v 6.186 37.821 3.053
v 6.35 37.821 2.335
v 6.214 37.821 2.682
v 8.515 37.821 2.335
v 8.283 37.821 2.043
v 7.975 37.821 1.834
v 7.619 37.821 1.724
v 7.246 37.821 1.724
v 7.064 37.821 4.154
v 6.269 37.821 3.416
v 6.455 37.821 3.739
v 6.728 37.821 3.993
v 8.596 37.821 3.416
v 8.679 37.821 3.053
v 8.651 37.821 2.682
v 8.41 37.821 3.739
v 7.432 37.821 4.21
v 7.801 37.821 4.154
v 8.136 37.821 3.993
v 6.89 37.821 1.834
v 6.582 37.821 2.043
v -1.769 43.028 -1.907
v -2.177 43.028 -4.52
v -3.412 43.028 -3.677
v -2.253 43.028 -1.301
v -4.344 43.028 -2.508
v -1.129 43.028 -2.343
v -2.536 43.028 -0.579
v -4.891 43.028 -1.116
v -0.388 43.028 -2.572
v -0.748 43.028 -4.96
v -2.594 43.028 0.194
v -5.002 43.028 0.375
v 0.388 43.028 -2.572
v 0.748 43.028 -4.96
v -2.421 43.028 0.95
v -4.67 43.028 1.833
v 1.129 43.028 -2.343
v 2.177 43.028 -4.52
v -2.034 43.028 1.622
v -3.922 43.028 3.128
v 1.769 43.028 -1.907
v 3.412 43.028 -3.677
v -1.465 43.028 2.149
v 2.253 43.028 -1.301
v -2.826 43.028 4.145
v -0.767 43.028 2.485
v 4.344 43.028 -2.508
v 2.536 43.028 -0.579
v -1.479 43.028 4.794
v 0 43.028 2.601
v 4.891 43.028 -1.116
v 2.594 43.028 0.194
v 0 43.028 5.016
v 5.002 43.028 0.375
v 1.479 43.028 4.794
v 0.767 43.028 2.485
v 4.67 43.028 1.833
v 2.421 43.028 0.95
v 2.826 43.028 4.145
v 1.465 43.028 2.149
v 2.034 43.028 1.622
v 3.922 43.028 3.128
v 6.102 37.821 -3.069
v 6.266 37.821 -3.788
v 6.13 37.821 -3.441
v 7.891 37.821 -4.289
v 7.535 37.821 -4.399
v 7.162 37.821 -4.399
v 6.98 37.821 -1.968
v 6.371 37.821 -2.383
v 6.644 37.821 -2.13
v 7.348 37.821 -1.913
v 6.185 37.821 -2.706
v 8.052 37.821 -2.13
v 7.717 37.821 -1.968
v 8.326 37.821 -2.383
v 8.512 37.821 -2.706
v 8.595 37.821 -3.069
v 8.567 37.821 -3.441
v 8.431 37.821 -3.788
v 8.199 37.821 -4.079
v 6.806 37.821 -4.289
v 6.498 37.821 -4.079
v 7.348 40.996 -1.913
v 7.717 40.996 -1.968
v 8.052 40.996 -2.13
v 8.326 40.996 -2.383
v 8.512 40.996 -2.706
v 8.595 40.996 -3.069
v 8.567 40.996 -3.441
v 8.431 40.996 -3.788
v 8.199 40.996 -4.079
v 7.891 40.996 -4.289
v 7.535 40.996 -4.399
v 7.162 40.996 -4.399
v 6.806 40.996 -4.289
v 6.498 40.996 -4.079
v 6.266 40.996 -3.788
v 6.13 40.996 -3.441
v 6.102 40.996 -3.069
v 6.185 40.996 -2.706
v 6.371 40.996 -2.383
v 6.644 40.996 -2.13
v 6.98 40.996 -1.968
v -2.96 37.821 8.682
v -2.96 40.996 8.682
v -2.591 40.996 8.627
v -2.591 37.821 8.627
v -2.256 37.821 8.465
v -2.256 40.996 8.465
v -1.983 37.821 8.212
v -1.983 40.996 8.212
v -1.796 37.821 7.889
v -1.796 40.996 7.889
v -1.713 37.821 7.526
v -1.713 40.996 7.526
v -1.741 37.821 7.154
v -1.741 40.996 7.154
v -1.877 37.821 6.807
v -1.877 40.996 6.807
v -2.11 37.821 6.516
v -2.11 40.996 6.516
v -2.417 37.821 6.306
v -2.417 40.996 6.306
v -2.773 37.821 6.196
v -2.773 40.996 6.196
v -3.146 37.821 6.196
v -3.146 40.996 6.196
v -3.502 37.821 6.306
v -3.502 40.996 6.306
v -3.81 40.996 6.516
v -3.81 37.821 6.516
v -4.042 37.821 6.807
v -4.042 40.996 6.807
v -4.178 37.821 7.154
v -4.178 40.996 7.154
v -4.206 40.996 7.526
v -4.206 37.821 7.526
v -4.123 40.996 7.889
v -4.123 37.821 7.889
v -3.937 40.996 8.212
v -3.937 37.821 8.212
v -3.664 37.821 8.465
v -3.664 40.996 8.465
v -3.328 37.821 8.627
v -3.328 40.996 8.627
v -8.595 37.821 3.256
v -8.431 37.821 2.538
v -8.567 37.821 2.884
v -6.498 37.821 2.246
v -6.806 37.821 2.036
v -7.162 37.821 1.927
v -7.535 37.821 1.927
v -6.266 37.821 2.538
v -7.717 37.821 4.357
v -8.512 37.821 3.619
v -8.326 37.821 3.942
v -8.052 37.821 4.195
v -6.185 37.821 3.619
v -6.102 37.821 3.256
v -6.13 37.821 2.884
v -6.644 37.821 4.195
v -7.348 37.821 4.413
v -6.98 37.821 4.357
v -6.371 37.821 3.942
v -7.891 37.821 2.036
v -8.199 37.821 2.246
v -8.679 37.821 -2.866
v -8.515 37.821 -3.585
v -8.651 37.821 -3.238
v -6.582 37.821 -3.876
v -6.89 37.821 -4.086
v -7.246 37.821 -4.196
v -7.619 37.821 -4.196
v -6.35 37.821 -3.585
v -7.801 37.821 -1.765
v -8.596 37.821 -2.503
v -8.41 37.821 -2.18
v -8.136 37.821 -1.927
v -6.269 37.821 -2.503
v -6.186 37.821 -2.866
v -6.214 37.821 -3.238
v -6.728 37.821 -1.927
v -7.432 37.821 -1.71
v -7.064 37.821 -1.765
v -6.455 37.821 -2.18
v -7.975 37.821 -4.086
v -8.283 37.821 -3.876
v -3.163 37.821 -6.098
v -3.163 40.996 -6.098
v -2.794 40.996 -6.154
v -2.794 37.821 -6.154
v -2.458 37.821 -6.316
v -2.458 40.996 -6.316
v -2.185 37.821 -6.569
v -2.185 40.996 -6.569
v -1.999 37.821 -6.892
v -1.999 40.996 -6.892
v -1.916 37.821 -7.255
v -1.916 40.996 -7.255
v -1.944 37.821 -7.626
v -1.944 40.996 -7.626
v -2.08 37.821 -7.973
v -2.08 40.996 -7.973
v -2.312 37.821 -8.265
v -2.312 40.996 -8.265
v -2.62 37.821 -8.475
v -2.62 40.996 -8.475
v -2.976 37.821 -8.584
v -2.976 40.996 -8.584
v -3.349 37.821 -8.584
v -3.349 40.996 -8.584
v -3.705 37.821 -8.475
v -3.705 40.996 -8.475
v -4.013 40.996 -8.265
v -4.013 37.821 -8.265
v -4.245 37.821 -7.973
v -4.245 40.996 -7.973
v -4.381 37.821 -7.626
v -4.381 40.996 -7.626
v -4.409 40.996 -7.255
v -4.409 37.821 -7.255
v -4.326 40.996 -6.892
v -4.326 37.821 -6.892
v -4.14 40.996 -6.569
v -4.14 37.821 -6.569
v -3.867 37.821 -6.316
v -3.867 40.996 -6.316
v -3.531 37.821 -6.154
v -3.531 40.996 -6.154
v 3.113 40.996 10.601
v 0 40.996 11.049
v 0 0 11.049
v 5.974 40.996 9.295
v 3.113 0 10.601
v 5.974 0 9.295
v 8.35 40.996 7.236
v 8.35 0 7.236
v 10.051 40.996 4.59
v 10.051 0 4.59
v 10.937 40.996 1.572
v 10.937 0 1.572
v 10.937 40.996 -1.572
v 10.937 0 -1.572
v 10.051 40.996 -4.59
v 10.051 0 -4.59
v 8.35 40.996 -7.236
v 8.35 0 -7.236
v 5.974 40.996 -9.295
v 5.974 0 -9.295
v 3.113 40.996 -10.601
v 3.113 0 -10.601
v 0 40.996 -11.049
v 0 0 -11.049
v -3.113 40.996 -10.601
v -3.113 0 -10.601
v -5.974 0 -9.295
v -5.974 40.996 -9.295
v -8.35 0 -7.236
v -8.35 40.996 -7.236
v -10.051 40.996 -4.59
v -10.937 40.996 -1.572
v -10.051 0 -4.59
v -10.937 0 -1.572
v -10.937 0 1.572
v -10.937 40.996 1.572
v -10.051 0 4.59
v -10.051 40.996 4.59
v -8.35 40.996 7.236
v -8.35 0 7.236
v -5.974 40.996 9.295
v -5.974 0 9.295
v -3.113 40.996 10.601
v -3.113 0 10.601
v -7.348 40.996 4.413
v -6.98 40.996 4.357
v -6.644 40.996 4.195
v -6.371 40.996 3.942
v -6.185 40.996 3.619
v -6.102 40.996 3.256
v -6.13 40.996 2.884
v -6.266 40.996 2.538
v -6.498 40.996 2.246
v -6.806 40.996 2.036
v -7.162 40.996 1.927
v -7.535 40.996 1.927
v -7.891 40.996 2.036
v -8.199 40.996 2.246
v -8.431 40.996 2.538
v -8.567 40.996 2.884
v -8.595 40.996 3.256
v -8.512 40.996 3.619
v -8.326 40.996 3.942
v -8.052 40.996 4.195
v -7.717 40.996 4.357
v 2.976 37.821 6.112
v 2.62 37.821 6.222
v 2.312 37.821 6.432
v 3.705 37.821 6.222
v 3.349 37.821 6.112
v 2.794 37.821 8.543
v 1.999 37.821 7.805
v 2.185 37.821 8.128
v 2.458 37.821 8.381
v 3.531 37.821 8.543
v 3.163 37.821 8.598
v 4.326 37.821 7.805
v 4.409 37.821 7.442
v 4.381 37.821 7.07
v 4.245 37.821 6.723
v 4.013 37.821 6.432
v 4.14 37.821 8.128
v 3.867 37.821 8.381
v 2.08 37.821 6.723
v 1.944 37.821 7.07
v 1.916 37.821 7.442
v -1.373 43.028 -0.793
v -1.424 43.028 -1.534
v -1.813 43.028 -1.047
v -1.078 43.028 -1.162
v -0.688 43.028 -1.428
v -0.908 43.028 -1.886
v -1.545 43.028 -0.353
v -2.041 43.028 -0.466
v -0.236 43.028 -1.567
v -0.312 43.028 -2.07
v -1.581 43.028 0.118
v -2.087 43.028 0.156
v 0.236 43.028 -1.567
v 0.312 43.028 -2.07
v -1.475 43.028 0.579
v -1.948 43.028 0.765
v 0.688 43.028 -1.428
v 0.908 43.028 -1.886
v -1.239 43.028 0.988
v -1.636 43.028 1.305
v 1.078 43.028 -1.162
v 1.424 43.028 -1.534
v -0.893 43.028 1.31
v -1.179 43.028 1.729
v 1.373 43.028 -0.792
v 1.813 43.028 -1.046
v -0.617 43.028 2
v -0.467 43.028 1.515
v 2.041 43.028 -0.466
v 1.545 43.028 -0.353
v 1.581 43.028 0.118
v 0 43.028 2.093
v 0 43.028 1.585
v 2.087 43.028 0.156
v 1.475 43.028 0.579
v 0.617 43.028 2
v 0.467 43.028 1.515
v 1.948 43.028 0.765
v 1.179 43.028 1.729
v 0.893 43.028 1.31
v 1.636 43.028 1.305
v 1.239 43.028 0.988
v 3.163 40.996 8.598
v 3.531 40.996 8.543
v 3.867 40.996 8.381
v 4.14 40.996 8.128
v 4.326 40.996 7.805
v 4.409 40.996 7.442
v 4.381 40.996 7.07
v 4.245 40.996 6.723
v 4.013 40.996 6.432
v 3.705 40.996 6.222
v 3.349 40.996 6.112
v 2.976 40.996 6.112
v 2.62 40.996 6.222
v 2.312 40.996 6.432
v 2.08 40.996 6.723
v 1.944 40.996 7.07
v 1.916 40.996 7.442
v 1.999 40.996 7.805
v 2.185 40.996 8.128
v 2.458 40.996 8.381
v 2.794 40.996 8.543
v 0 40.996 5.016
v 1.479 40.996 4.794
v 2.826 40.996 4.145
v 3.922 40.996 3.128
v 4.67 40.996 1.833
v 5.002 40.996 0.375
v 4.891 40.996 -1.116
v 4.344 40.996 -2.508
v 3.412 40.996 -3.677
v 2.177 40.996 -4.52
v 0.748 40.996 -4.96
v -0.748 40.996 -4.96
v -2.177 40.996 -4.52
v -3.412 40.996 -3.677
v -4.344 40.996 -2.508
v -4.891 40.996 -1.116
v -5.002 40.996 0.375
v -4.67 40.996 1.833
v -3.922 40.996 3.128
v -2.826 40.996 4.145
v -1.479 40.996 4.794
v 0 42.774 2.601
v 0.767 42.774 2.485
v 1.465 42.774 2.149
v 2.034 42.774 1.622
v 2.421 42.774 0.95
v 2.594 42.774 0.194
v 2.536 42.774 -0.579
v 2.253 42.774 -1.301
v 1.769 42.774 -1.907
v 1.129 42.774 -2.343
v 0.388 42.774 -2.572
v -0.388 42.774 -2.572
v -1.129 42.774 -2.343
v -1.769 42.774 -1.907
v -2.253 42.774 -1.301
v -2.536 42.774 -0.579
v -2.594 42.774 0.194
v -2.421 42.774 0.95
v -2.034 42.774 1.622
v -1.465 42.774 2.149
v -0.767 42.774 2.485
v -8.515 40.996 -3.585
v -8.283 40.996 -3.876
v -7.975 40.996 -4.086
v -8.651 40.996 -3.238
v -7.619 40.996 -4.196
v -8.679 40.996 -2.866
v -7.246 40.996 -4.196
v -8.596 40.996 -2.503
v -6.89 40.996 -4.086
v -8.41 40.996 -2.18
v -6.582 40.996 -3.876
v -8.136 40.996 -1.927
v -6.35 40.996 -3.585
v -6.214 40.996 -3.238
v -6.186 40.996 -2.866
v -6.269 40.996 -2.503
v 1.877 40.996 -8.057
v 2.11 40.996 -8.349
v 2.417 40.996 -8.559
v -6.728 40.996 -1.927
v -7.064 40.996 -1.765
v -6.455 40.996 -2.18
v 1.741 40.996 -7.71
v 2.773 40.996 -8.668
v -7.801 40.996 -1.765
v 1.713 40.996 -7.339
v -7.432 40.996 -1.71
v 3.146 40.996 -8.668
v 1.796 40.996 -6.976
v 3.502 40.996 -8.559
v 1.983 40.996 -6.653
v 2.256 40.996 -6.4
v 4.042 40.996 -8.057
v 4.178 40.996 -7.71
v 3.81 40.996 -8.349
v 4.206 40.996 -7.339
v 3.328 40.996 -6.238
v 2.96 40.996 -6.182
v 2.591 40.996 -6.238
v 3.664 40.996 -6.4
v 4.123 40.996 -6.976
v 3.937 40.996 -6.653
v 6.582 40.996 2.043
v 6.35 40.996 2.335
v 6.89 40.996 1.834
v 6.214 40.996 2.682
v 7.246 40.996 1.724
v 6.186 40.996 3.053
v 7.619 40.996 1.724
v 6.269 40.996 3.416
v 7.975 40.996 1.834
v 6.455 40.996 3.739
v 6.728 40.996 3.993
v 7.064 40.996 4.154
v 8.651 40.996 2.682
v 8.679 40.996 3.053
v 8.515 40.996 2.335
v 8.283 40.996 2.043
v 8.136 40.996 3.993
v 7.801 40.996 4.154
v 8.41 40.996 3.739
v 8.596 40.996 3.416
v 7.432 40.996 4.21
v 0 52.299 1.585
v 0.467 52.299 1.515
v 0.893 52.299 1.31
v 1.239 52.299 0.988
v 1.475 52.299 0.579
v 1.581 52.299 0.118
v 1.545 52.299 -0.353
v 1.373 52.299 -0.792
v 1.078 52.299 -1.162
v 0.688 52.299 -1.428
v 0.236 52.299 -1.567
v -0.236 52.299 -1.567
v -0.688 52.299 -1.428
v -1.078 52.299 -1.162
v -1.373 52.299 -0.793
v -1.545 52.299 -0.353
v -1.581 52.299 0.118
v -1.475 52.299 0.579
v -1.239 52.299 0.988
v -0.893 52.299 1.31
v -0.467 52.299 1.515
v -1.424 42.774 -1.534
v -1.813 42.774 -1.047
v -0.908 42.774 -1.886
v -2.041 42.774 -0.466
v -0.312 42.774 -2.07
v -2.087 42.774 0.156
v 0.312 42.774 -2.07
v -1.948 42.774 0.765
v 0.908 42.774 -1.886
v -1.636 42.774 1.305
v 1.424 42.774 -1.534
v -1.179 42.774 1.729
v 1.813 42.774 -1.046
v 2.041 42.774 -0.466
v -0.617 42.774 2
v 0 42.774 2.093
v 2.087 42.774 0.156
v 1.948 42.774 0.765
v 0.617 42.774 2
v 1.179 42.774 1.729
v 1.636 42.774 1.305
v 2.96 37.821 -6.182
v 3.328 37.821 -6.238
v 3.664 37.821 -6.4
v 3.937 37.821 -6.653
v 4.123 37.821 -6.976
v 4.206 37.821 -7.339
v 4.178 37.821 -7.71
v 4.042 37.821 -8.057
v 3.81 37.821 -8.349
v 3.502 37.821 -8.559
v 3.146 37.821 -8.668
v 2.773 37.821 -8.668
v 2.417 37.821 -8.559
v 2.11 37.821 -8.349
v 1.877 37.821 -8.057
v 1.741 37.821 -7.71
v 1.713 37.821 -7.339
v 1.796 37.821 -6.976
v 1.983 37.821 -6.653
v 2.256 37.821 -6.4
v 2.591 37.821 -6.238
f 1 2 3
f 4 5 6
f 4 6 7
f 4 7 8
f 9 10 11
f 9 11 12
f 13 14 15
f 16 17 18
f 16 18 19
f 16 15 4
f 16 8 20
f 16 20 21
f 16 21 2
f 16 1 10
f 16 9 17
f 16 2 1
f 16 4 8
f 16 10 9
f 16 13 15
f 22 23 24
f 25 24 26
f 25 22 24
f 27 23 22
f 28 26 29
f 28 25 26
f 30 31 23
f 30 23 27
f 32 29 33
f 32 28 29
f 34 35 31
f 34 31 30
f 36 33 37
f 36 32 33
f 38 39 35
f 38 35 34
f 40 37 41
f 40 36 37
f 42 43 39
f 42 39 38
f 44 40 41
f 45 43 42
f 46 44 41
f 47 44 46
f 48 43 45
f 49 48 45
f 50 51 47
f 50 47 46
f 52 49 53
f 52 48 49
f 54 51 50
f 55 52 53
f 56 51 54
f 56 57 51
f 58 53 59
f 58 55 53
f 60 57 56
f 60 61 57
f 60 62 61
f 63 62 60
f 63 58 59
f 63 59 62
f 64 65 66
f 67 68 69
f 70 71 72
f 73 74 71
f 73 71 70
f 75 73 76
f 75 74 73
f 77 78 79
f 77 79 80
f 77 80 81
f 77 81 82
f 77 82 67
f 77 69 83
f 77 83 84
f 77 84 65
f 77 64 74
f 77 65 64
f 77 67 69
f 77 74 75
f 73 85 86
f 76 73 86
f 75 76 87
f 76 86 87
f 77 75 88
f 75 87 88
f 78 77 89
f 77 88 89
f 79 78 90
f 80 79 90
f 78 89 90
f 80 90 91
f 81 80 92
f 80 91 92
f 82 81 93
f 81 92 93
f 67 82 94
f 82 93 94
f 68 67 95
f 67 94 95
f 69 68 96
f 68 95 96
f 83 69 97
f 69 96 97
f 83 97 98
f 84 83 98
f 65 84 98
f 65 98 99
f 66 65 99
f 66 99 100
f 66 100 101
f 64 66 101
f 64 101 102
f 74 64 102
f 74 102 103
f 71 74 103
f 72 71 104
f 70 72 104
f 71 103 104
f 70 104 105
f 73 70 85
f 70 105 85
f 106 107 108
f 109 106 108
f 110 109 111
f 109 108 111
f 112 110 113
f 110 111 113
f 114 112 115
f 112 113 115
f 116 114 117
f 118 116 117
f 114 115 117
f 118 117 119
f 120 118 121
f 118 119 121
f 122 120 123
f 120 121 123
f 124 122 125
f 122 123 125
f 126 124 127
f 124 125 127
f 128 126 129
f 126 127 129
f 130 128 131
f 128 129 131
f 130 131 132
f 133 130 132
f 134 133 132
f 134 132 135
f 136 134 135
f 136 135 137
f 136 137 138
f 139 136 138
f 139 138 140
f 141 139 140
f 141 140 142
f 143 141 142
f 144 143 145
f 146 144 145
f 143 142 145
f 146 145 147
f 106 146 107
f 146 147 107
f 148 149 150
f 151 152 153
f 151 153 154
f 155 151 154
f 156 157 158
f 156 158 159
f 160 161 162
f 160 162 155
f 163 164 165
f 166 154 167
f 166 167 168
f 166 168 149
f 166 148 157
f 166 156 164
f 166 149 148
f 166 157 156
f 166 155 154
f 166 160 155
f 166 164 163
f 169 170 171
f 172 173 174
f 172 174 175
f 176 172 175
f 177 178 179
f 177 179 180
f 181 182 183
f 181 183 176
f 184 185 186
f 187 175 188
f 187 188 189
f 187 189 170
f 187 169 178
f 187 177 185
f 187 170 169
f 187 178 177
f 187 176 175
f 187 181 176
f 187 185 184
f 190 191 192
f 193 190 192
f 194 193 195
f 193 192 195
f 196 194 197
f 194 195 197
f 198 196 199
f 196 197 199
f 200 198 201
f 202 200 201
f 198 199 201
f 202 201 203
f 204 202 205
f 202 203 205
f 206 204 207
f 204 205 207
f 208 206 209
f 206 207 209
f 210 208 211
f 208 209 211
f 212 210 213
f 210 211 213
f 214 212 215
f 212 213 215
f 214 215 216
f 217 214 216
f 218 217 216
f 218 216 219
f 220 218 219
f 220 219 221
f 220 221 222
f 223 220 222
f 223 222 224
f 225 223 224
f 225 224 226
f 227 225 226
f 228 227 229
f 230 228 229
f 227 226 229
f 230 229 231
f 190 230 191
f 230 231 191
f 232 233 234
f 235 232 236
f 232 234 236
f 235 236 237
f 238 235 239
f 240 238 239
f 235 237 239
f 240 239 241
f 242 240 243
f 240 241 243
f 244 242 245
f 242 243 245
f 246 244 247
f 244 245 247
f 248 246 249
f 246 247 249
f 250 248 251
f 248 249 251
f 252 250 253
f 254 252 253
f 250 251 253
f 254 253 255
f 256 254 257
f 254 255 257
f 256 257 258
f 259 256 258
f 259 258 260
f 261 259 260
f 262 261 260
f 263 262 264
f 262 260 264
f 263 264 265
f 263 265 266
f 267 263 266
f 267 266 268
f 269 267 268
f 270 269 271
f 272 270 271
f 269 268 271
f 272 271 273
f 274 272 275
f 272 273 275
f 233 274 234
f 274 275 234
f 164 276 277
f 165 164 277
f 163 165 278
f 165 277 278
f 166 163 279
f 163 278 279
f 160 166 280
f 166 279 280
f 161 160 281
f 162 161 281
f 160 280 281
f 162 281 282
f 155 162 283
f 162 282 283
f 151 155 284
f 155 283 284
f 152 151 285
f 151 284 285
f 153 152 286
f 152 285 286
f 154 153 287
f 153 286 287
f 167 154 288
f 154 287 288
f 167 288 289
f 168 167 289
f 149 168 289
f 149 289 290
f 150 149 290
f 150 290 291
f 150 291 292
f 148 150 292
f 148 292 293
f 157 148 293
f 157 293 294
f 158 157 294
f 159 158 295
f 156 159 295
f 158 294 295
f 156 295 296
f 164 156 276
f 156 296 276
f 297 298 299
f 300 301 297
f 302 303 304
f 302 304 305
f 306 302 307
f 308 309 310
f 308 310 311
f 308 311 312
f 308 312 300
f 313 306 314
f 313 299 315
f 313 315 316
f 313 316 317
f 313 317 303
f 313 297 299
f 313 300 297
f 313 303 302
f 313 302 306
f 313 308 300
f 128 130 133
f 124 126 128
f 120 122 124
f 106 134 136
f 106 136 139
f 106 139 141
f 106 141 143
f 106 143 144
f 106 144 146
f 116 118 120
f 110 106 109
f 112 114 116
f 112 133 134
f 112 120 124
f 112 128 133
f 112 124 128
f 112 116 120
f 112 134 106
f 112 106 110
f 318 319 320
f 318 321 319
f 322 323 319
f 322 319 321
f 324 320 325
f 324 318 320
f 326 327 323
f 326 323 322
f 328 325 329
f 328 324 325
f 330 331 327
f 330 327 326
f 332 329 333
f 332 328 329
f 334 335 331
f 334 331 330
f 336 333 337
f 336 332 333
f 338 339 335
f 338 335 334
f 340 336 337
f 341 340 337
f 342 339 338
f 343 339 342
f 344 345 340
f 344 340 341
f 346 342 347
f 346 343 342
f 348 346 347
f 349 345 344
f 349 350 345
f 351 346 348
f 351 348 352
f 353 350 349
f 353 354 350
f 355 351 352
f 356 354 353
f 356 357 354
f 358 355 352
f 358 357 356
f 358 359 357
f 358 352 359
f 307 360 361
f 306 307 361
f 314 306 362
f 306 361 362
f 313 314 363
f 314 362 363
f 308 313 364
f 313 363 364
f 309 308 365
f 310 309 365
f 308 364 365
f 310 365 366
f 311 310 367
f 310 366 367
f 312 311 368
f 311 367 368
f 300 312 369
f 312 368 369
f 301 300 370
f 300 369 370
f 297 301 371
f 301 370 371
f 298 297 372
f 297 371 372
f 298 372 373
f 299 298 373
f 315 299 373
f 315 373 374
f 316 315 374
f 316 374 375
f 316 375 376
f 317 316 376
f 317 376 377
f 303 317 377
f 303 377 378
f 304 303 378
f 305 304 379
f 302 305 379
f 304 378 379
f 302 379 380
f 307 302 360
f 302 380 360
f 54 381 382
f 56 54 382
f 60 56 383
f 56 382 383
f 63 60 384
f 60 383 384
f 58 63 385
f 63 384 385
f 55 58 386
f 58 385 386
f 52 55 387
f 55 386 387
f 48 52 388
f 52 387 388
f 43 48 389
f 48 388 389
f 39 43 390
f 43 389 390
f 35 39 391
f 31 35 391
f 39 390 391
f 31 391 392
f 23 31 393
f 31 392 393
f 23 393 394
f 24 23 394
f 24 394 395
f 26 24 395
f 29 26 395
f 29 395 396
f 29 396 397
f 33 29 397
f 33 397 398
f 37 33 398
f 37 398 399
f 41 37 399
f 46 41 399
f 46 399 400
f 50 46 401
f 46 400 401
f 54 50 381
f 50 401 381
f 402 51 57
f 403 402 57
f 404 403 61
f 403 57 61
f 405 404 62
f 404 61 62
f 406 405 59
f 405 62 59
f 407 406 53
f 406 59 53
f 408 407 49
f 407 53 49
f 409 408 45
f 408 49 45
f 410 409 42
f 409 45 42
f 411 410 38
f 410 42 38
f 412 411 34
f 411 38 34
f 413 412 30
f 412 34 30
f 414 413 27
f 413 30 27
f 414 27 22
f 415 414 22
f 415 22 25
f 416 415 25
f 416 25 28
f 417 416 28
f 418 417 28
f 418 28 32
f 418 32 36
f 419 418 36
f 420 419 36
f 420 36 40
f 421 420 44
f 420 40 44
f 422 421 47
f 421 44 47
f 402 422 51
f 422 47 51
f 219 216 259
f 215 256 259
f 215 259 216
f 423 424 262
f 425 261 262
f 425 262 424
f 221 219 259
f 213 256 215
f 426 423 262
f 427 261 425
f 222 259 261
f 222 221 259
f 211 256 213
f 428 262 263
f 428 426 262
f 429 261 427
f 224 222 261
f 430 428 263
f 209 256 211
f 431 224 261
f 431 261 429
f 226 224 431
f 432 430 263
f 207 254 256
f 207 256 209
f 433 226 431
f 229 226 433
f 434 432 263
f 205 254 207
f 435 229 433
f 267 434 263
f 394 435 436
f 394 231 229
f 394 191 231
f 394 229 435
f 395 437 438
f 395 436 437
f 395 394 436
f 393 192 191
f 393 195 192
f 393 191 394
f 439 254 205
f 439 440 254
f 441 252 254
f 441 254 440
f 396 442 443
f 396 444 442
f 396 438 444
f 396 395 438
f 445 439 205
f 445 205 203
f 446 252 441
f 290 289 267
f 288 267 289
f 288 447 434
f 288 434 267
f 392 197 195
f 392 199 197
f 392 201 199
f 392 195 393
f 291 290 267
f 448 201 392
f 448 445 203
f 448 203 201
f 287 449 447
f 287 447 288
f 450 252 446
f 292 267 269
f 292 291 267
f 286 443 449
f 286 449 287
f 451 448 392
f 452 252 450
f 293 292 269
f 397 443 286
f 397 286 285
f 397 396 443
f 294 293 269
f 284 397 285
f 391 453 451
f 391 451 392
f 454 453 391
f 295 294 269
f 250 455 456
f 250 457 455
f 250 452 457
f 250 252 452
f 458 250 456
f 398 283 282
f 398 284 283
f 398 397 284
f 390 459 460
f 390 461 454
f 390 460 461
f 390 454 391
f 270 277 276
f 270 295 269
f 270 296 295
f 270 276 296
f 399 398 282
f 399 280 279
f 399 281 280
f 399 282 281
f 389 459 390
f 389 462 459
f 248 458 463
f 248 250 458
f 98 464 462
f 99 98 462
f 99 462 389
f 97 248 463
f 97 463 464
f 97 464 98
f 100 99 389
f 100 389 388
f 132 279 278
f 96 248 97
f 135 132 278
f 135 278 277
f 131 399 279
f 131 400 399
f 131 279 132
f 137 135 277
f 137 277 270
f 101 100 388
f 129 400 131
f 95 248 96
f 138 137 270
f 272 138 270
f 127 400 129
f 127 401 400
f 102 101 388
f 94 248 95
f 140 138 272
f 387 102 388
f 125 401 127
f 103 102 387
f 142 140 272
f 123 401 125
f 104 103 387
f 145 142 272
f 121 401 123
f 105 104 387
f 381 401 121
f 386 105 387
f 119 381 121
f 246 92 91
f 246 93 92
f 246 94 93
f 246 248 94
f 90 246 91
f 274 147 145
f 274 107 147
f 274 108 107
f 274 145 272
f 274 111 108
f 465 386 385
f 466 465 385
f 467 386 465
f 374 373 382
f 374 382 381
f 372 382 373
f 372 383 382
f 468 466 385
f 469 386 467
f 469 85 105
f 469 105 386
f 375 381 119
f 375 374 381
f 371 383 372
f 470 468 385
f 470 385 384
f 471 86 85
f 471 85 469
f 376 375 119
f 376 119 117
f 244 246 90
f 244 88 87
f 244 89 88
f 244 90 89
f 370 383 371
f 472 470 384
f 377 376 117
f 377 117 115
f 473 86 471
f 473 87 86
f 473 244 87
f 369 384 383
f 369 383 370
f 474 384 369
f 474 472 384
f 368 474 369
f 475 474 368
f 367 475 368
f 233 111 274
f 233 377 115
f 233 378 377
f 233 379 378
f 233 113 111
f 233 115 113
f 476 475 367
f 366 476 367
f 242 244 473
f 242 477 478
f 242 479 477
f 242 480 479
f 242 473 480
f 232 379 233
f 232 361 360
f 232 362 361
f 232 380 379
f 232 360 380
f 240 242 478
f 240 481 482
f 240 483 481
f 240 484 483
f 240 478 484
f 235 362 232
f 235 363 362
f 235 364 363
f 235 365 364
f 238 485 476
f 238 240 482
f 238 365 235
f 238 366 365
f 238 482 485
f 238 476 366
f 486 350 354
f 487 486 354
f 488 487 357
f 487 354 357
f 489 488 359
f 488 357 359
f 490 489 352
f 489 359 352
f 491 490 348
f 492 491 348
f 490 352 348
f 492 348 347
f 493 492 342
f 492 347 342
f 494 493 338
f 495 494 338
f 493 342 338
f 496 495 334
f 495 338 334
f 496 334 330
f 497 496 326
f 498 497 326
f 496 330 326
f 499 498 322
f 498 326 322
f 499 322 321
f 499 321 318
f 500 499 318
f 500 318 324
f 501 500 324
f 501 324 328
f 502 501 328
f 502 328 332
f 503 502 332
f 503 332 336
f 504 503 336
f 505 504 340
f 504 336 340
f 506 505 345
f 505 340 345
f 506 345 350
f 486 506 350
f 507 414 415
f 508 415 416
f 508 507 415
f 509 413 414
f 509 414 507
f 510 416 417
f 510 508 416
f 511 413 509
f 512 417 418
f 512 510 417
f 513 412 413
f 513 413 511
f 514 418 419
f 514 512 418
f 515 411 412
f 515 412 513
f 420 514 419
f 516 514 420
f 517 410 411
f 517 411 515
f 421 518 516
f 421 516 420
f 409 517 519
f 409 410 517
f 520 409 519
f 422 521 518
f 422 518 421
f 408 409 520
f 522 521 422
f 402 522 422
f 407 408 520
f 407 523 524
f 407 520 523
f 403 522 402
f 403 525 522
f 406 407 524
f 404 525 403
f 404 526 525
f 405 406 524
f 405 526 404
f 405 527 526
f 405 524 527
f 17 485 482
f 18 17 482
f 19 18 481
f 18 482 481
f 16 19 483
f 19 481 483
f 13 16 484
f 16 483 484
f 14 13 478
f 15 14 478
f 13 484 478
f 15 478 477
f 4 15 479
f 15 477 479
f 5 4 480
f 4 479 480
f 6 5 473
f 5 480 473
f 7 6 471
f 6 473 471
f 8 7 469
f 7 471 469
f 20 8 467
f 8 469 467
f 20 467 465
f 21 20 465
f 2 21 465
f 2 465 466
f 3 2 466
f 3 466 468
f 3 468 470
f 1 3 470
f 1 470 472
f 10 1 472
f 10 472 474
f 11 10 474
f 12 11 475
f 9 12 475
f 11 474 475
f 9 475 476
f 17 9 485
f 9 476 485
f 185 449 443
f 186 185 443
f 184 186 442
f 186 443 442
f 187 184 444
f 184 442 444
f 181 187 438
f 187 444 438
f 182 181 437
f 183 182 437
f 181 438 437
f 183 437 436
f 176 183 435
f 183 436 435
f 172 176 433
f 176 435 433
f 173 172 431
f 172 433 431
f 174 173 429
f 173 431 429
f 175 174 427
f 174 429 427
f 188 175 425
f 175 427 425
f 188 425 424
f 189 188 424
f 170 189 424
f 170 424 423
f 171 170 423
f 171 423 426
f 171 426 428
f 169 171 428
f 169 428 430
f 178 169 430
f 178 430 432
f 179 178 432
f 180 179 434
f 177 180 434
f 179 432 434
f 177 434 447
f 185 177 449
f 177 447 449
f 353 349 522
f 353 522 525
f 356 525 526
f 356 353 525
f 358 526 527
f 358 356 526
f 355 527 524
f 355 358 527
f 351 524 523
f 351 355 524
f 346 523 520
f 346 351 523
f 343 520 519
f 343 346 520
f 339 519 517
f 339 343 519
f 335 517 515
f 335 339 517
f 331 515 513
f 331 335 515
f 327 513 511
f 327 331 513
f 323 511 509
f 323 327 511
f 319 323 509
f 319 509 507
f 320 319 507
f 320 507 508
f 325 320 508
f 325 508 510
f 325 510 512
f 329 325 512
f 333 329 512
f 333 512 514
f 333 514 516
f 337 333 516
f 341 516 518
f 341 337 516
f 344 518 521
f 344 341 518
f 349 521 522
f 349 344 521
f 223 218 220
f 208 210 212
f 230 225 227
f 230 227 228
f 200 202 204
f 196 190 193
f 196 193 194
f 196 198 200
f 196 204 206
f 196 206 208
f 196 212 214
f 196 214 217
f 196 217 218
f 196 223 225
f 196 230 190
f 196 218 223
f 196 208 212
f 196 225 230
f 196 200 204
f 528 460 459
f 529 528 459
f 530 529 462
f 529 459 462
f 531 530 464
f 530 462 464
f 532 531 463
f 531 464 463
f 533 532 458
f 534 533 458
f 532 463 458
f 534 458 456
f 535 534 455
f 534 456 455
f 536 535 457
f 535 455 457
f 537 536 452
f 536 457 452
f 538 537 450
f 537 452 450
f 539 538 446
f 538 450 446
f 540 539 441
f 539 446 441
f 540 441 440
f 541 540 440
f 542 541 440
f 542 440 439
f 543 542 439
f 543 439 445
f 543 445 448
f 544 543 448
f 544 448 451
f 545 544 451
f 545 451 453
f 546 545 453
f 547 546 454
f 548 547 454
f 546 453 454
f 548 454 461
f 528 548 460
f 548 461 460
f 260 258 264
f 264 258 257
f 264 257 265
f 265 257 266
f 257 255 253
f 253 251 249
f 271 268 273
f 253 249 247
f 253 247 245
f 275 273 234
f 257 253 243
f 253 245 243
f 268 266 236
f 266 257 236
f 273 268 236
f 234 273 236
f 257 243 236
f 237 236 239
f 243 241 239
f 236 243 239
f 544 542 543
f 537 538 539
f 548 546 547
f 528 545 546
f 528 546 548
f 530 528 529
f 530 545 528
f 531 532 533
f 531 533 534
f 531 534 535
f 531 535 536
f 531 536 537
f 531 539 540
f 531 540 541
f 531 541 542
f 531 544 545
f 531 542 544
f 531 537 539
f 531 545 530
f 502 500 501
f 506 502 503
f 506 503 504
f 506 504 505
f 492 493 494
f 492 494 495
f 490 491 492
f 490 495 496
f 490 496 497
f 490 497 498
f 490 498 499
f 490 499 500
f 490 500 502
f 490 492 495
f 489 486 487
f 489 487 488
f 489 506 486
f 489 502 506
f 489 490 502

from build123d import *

# Parameters (mm, degrees)
SKETCH1_R           = 11.049
BOSS_EXTRUDE1_DEPTH = 40.9956
SKETCH2_R           = 5.0165
BOSS_EXTRUDE2_DEPTH = 2.032
SKETCH3_R           = 1.585
BOSS_EXTRUDE3_DEPTH = 9.271
SKETCH5_R           = 1.25
CUT_EXTRUDE4_DEPTH  = 3.175
SKETCH7_R           = 2.601
SKETCH7_R_2         = 2.093
CUT_EXTRUDE5_DEPTH  = 0.254


with BuildPart() as part:
    # Sketch1 → Boss-Extrude1 (new body)
    with BuildSketch(Plane(origin=(0, 0, 0), x_dir=(1, 0, 0), z_dir=(0, 1, 0))):
        with Locations(Location((0, 0, 0), (0, 0, 270))):
            Circle(SKETCH1_R)
    extrude(amount=BOSS_EXTRUDE1_DEPTH)

    # Sketch2 → Boss-Extrude2 (add)
    with BuildSketch(Plane(origin=(0, 40.9956, 0), x_dir=(1, 0, 0), z_dir=(0, 1, 0))):
        with Locations(Location((0, 0, 0), (0, 0, 270))):
            Circle(SKETCH2_R)
    extrude(amount=BOSS_EXTRUDE2_DEPTH)

    # Sketch3 → Boss-Extrude3 (add)
    with BuildSketch(Plane(origin=(0, 43.0276, 0), x_dir=(1, 0, 0), z_dir=(0, 1, 0))):
        with Locations(Location((0, 0, 0), (0, 0, 270))):
            Circle(SKETCH3_R)
    extrude(amount=BOSS_EXTRUDE3_DEPTH)

    # Sketch5 → Cut-Extrude4 (cut)
    with BuildSketch(Plane(origin=(0, 40.9956, 0), x_dir=(1, 0, 0), z_dir=(0, 1, 0))):
        with Locations(Location((-7.432335625, 2.959795122, 0), (0, 0, 270))):
            Circle(SKETCH5_R)
        with Locations(Location((-3.162563719, 7.348346122, 0), (0, 0, 270))):
            Circle(SKETCH5_R)
        with Locations(Location((2.959795122, 7.432335625, 0), (0, 0, 270))):
            Circle(SKETCH5_R)
        with Locations(Location((7.348346122, 3.162563719, 0), (0, 0, 270))):
            Circle(SKETCH5_R)
        with Locations(Location((7.432335625, -2.959795122, 0), (0, 0, 270))):
            Circle(SKETCH5_R)
        with Locations(Location((3.162563719, -7.348346122, 0), (0, 0, 270))):
            Circle(SKETCH5_R)
        with Locations(Location((-2.959795122, -7.432335625, 0), (0, 0, 270))):
            Circle(SKETCH5_R)
        with Locations(Location((-7.348346122, -3.162563719, 0), (0, 0, 270))):
            Circle(SKETCH5_R)
    extrude(amount=-CUT_EXTRUDE4_DEPTH, mode=Mode.SUBTRACT)

    # Sketch7 → Cut-Extrude5 (cut)
    with BuildSketch(Plane(origin=(0, 43.0276, 0), x_dir=(1, 0, 0), z_dir=(0, 1, 0))):
        with Locations(Location((0, 0, 0), (0, 0, 270))):
            Circle(SKETCH7_R)
        with Locations(Location((0, 0, 0), (0, 0, 270))):
            Circle(SKETCH7_R_2, mode=Mode.SUBTRACT)
    extrude(amount=-CUT_EXTRUDE5_DEPTH, mode=Mode.SUBTRACT)


solid = part.part
